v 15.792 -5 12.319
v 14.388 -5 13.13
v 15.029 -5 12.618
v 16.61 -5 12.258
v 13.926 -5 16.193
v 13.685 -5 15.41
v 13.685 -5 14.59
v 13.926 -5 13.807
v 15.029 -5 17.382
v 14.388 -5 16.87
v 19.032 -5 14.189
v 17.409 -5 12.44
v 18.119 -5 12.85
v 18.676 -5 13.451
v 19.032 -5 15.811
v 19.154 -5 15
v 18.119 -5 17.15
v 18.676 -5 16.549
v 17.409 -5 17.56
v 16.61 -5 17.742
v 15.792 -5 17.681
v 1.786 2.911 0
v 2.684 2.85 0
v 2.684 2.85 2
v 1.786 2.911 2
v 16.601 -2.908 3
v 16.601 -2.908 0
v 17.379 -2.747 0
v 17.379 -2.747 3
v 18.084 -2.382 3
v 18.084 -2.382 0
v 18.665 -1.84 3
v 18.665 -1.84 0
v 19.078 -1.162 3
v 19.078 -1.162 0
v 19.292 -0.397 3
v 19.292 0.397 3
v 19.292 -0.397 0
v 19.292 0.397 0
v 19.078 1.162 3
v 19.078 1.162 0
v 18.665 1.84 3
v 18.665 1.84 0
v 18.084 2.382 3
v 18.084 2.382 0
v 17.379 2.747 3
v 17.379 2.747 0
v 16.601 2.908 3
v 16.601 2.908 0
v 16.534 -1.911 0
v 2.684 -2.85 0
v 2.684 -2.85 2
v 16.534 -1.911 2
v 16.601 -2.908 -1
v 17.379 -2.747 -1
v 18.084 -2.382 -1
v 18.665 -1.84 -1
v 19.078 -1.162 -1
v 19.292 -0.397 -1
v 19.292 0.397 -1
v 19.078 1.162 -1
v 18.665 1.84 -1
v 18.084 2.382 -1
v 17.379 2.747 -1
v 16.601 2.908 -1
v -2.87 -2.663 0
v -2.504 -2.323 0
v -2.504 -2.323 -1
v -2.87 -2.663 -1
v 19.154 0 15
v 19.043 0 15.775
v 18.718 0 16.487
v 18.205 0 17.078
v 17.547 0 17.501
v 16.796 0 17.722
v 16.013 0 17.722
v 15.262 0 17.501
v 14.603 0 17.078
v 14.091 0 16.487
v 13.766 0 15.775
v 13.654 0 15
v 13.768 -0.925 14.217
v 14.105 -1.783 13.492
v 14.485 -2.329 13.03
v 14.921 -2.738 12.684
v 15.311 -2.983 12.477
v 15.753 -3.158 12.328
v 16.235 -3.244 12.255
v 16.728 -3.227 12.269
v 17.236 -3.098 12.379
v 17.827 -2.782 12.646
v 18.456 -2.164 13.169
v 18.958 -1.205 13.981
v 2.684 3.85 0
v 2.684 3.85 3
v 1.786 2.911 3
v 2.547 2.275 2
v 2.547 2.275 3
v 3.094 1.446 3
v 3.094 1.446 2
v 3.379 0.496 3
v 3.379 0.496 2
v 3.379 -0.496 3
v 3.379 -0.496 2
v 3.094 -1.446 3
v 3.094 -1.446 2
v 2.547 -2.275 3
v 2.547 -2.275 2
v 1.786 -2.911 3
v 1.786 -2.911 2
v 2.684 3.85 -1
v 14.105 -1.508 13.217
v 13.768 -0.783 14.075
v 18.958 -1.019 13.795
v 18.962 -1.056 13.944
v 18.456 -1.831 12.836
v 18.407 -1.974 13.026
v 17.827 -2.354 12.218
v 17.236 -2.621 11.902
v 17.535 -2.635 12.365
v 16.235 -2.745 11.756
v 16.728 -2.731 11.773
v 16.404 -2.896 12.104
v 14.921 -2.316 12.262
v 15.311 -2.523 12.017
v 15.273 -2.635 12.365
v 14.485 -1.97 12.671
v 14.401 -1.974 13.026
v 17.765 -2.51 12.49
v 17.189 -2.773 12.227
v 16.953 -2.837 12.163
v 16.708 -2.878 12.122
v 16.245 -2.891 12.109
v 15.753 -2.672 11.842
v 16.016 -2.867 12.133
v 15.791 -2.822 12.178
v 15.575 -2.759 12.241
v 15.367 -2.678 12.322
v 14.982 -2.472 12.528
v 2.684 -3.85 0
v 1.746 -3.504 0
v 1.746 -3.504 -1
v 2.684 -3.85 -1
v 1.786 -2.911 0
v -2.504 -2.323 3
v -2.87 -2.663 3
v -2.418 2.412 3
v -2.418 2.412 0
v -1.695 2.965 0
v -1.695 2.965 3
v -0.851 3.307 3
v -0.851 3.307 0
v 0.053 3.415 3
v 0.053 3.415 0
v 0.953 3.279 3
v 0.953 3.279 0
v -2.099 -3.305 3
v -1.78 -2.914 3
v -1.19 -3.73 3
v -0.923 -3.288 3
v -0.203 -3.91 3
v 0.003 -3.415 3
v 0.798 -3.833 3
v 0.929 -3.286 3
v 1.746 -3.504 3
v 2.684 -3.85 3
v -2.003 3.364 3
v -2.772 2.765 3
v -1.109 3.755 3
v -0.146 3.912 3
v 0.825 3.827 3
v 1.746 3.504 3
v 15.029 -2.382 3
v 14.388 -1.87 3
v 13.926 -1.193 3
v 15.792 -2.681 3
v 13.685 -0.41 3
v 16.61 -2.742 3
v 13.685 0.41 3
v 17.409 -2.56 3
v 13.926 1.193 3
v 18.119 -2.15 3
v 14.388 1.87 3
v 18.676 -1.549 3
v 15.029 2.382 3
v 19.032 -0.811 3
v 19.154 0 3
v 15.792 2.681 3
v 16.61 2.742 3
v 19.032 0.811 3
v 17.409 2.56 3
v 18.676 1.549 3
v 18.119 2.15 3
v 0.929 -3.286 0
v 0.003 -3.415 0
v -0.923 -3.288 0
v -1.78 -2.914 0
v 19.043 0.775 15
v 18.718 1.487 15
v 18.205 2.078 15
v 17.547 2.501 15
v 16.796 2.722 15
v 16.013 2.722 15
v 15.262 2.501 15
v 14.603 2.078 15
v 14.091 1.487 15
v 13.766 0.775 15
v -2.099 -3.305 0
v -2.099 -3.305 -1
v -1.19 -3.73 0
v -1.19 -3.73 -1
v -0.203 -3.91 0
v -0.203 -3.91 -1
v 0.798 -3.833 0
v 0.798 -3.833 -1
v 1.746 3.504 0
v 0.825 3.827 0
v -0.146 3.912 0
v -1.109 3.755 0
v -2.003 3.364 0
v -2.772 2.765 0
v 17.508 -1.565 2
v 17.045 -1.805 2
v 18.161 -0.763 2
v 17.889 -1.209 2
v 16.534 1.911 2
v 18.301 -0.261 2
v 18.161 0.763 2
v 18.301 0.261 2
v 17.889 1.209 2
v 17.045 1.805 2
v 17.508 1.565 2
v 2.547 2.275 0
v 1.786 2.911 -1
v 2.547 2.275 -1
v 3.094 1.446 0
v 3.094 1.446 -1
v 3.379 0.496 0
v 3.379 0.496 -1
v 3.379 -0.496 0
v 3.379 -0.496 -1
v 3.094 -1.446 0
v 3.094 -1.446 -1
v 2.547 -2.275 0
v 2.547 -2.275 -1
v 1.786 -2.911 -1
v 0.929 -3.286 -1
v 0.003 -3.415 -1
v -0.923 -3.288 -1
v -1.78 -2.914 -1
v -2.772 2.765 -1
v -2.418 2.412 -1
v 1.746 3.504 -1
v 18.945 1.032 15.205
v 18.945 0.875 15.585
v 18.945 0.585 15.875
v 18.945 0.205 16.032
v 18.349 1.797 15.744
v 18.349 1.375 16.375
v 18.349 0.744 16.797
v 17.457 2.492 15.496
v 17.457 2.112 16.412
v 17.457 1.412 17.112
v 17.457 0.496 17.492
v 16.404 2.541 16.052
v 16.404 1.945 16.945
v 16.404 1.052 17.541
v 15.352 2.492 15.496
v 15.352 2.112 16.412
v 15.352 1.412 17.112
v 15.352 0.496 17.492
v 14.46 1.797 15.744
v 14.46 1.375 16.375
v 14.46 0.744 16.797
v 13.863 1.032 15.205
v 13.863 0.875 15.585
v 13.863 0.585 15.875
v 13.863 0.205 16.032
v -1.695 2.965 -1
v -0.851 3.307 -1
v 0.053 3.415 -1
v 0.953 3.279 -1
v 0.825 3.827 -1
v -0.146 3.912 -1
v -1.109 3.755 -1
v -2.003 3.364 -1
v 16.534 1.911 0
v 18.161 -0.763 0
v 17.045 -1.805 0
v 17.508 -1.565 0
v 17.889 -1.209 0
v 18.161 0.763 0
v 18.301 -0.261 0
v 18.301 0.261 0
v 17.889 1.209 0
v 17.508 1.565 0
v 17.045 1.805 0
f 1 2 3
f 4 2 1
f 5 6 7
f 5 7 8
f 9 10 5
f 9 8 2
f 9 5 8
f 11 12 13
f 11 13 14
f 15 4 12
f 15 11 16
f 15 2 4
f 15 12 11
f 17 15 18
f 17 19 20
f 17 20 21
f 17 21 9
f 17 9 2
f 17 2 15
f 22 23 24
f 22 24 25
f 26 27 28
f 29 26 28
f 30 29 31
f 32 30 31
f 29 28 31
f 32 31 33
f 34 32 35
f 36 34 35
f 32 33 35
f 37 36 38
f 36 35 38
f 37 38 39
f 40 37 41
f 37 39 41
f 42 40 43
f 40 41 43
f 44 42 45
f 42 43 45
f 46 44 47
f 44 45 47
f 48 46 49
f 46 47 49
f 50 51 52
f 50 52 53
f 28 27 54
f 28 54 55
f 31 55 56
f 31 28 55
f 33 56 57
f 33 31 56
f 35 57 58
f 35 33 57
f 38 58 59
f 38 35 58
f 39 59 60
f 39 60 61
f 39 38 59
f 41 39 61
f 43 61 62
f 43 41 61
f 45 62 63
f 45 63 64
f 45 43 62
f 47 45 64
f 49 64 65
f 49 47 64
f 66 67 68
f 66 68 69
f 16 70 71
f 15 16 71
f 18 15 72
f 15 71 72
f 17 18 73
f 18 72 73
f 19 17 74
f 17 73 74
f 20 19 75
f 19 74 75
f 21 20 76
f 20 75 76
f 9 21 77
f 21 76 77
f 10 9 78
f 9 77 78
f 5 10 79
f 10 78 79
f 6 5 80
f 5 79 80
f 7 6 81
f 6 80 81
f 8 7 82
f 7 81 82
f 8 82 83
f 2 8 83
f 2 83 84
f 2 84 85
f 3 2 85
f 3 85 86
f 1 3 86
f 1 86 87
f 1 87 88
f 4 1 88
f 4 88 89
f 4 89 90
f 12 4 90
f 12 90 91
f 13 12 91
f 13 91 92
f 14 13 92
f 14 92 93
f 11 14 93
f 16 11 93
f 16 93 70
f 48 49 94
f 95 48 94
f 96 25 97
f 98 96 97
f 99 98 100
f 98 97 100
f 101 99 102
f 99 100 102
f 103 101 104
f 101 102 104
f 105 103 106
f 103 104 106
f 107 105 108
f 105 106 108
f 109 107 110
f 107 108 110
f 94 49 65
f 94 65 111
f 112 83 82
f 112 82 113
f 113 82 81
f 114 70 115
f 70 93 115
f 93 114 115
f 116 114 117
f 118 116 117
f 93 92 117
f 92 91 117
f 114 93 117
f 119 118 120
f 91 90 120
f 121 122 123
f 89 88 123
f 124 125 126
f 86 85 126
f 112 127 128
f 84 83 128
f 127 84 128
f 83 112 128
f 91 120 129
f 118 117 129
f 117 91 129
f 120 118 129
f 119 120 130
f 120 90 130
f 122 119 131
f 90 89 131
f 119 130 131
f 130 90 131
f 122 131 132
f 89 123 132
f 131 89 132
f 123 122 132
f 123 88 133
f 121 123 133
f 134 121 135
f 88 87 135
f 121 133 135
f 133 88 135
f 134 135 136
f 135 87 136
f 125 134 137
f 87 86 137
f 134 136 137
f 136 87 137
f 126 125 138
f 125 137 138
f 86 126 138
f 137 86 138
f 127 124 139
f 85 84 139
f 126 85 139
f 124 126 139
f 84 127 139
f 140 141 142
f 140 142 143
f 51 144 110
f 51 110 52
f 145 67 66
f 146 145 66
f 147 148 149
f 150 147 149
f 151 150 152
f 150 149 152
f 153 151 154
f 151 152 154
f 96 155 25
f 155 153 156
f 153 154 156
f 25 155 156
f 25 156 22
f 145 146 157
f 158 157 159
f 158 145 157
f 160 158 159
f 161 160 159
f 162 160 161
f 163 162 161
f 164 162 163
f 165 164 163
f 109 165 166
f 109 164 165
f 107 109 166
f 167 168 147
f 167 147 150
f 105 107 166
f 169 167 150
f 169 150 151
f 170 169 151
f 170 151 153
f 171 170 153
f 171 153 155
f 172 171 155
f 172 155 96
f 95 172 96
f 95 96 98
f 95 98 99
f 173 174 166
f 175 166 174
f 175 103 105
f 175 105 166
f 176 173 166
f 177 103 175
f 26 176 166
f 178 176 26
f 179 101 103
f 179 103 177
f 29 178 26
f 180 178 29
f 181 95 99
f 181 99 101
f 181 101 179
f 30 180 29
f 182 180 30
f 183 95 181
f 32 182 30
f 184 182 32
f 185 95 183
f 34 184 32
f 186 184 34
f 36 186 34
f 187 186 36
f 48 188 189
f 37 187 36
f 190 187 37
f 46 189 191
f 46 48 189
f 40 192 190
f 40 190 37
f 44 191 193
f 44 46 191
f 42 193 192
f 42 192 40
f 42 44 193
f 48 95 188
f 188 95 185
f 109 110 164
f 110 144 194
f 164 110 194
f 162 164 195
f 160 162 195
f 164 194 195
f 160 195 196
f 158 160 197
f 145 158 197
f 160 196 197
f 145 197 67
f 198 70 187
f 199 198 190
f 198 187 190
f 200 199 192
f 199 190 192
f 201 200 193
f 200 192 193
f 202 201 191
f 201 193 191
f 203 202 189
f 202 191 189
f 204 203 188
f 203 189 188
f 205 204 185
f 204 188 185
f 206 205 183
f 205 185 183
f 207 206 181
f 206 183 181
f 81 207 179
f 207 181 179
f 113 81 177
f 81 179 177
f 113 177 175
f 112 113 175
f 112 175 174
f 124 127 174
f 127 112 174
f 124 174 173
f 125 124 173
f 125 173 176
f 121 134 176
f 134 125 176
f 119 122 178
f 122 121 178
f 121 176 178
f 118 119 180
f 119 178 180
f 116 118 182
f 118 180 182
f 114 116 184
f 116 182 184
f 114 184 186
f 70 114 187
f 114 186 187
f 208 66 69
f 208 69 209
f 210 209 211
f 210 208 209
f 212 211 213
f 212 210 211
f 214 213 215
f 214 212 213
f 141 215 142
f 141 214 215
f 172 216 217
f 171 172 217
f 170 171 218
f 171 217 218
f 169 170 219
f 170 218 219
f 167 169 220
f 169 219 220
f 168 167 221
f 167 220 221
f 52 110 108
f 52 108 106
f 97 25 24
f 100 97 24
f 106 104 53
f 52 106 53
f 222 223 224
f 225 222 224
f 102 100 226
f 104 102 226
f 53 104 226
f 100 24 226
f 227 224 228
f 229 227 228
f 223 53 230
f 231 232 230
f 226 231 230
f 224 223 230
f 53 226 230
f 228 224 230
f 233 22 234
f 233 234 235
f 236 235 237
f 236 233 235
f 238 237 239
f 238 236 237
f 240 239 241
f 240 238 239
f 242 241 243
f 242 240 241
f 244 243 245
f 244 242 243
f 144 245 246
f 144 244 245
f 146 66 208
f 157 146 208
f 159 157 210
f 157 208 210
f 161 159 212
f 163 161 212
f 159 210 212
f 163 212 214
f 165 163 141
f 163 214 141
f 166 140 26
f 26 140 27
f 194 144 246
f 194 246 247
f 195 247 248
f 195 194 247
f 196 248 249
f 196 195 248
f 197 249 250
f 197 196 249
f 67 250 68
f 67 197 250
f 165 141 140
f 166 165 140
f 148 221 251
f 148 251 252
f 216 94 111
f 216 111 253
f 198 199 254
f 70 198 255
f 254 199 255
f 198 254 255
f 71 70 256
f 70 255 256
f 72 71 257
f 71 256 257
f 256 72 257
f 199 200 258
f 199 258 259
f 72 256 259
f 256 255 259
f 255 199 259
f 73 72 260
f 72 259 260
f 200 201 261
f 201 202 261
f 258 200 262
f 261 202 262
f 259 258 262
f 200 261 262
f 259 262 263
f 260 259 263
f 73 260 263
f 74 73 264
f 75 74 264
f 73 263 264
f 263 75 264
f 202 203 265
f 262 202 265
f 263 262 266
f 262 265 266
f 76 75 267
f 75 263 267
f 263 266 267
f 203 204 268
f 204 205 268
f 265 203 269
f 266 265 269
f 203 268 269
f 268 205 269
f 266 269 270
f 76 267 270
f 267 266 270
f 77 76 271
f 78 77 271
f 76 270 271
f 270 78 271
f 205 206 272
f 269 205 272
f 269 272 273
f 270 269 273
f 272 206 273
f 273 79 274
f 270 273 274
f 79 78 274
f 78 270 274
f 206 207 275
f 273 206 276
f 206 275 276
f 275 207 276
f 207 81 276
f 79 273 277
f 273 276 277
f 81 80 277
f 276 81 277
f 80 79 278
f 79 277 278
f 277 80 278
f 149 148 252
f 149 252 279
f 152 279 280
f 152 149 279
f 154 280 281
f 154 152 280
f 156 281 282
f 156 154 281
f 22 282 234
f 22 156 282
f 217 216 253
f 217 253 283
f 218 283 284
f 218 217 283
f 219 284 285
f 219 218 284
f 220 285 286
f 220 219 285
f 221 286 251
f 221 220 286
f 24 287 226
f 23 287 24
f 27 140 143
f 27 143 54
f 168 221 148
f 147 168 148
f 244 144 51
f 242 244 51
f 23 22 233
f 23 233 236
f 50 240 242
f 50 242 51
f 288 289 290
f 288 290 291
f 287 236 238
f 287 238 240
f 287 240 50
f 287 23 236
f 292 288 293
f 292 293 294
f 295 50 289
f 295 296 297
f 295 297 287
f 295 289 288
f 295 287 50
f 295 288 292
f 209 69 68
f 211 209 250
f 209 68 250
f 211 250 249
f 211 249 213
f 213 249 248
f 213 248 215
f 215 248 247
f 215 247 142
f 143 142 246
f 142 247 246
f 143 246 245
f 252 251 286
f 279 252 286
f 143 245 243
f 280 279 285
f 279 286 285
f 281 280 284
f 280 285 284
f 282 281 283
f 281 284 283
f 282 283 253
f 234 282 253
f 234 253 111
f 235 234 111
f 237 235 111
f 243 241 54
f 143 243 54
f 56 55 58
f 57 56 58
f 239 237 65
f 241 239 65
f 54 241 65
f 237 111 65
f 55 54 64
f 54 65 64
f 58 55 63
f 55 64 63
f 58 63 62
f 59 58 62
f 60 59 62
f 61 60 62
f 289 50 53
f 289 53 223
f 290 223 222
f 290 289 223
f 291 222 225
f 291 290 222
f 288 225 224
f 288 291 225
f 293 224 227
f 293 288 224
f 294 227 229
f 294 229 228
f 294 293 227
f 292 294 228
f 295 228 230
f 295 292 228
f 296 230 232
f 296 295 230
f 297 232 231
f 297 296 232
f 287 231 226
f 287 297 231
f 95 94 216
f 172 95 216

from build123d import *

# Parameters (mm, degrees)
F1_DEPTH = 1
F2_DEPTH = 3
F3_DEPTH = 2
F4_R     = 2.75
F5_DEPTH = 12
F7_ANGLE = 90
F8_R     = 2.75
F9_DEPTH = 5
F10_R    = 0.5


# Not quite as in the source:
# - a feature names something its author has since deleted; it is built from what else it names


with BuildPart() as f1:
    # F0 (on Top) → F1 (new body)
    with BuildSketch(Plane.XY):
        with BuildLine():
            ThreePointArc((1.7856760203, -2.9109424849), (-0.4640879363, -3.3833189899), (-2.5035568051, -2.3225908645))
            Line((-2.5035568051, -2.3225908645), (-2.870109778, -2.6626480921))
            ThreePointArc((-2.870109778, -2.6626480921), (-0.7021528954, -3.8515200001), (1.745866363, -3.5041654702))
            ThreePointArc((1.745866363, -3.5041654702), (2.2390334242, -3.2115345748), (2.6841618804, -2.85))
            Line((2.6841618804, -2.85), (1.7856760203, -2.9109424849))
        make_face()
        with BuildLine():
            ThreePointArc((1.7856760202, 2.910942485), (3.415, 0), (1.7856760203, -2.9109424849))
            Line((1.7856760203, -2.9109424849), (2.6841618804, -2.85))
            ThreePointArc((2.6841618804, -2.85), (3.915, 0), (2.6841618804, 2.85))
            Line((2.6841618803, 2.85), (1.7856760202, 2.910942485))
        make_face()
        with BuildLine():
            ThreePointArc((-2.4179432279, 2.4115919113), (-0.4028376898, 3.391157147), (1.7856760202, 2.910942485))
            Line((1.7856760202, 2.910942485), (2.6841618803, 2.85))
            ThreePointArc((2.6841618804, 2.85), (2.2390334242, 3.2115345748), (1.7458663629, 3.5041654702))
            ThreePointArc((1.7458663629, 3.5041654702), (-0.6323981068, 3.8635861107), (-2.7719612701, 2.7646800388))
            Line((-2.7719612701, 2.7646800388), (-2.4179432279, 2.4115919113))
        make_face()
        with BuildLine():
            Line((16.533754708, -1.9106100332), (2.6841618804, -2.85))
            ThreePointArc((2.6841618804, -2.85), (2.2390334242, -3.2115345748), (1.745866363, -3.5041654702))
            Line((1.745866363, -3.5041654702), (2.6841618804, -3.85))
            Line((2.6841618804, -3.85), (16.6009492353, -2.9083500025))
            ThreePointArc((16.6009492353, -2.9083500025), (19.3191618804, 0), (16.6009492353, 2.9083500025))
            Line((16.6009492353, 2.9083500025), (2.6841618803, 3.85))
            Line((2.6841618803, 3.85), (2.6841618803, 2.85))
            Line((2.6841618803, 2.85), (16.533754708, 1.9106100332))
            ThreePointArc((16.533754708, 1.9106100332), (18.3191618804, 0), (16.533754708, -1.9106100332))
        make_face()
        with BuildLine():
            ThreePointArc((2.6841618804, 2.85), (3.915, 0), (2.6841618804, -2.85))
            Line((2.6841618804, -2.85), (16.533754708, -1.9106100332))
            ThreePointArc((16.533754708, -1.9106100332), (18.3191618804, 0), (16.533754708, 1.9106100332))
            Line((16.533754708, 1.9106100332), (2.6841618803, 2.85))
        make_face()
        with BuildLine():
            ThreePointArc((1.7458663629, 3.5041654702), (2.2390334242, 3.2115345748), (2.6841618804, 2.85))
            Line((2.6841618803, 2.85), (2.6841618803, 3.85))
            Line((2.6841618803, 3.85), (1.7458663629, 3.5041654702))
        make_face()
    extrude(amount=-F1_DEPTH)

    # F0 (on Top) → F2 (join)
    with BuildSketch(Plane.XY):
        with BuildLine():
            ThreePointArc((1.7856760203, -2.9109424849), (-0.4640879363, -3.3833189899), (-2.5035568051, -2.3225908645))
            Line((-2.5035568051, -2.3225908645), (-2.870109778, -2.6626480921))
            ThreePointArc((-2.870109778, -2.6626480921), (-0.7021528954, -3.8515200001), (1.745866363, -3.5041654702))
            ThreePointArc((1.745866363, -3.5041654702), (2.2390334242, -3.2115345748), (2.6841618804, -2.85))
            Line((2.6841618804, -2.85), (1.7856760203, -2.9109424849))
        make_face()
        with BuildLine():
            ThreePointArc((1.7856760202, 2.910942485), (3.415, 0), (1.7856760203, -2.9109424849))
            Line((1.7856760203, -2.9109424849), (2.6841618804, -2.85))
            ThreePointArc((2.6841618804, -2.85), (3.915, 0), (2.6841618804, 2.85))
            Line((2.6841618803, 2.85), (1.7856760202, 2.910942485))
        make_face()
        with BuildLine():
            ThreePointArc((-2.4179432279, 2.4115919113), (-0.4028376898, 3.391157147), (1.7856760202, 2.910942485))
            Line((1.7856760202, 2.910942485), (2.6841618803, 2.85))
            ThreePointArc((2.6841618804, 2.85), (2.2390334242, 3.2115345748), (1.7458663629, 3.5041654702))
            ThreePointArc((1.7458663629, 3.5041654702), (-0.6323981068, 3.8635861107), (-2.7719612701, 2.7646800388))
            Line((-2.7719612701, 2.7646800388), (-2.4179432279, 2.4115919113))
        make_face()
        with BuildLine():
            ThreePointArc((1.7458663629, 3.5041654702), (2.2390334242, 3.2115345748), (2.6841618804, 2.85))
            Line((2.6841618803, 2.85), (2.6841618803, 3.85))
            Line((2.6841618803, 3.85), (1.7458663629, 3.5041654702))
        make_face()
        with BuildLine():
            Line((16.533754708, -1.9106100332), (2.6841618804, -2.85))
            ThreePointArc((2.6841618804, -2.85), (2.2390334242, -3.2115345748), (1.745866363, -3.5041654702))
            Line((1.745866363, -3.5041654702), (2.6841618804, -3.85))
            Line((2.6841618804, -3.85), (16.6009492353, -2.9083500025))
            ThreePointArc((16.6009492353, -2.9083500025), (19.3191618804, 0), (16.6009492353, 2.9083500025))
            Line((16.6009492353, 2.9083500025), (2.6841618803, 3.85))
            Line((2.6841618803, 3.85), (2.6841618803, 2.85))
            Line((2.6841618803, 2.85), (16.533754708, 1.9106100332))
            ThreePointArc((16.533754708, 1.9106100332), (18.3191618804, 0), (16.533754708, -1.9106100332))
        make_face()
        with BuildLine():
            ThreePointArc((2.6841618804, 2.85), (3.915, 0), (2.6841618804, -2.85))
            Line((2.6841618804, -2.85), (16.533754708, -1.9106100332))
            ThreePointArc((16.533754708, -1.9106100332), (18.3191618804, 0), (16.533754708, 1.9106100332))
            Line((16.533754708, 1.9106100332), (2.6841618803, 2.85))
        make_face()
    extrude(amount=F2_DEPTH)

    # F0 (on Top) → F3 (cut)
    with BuildSketch(Plane.XY):
        with BuildLine():
            ThreePointArc((2.6841618804, 2.85), (3.915, 0), (2.6841618804, -2.85))
            Line((2.6841618804, -2.85), (16.533754708, -1.9106100332))
            ThreePointArc((16.533754708, -1.9106100332), (18.3191618804, 0), (16.533754708, 1.9106100332))
            Line((16.533754708, 1.9106100332), (2.6841618803, 2.85))
        make_face()
        with BuildLine():
            ThreePointArc((1.7856760202, 2.910942485), (3.415, 0), (1.7856760203, -2.9109424849))
            Line((1.7856760203, -2.9109424849), (2.6841618804, -2.85))
            ThreePointArc((2.6841618804, -2.85), (3.915, 0), (2.6841618804, 2.85))
            Line((2.6841618803, 2.85), (1.7856760202, 2.910942485))
        make_face()
    extrude(amount=F3_DEPTH, mode=Mode.SUBTRACT)

    # F4 (on face) → F5 (join)
    with BuildSketch(Plane.XY.offset(3)):
        with Locations((16.4041618804, 0)):
            Circle(F4_R)
    extrude(amount=F5_DEPTH)

    # F6 (on face) → F7 (revolve)
    with BuildSketch(Plane.XY.offset(15)):
        with BuildLine():
            Line((13.6541618804, 0), (19.1541618804, 0))
            ThreePointArc((19.1541618804, 0), (16.4041618804, 2.75), (13.6541618804, 0))
        make_face()
    revolve(axis=Axis((16.4041618804, 0, 15), (1, 0, 0)), revolution_arc=F7_ANGLE)

    # F8 (on face) → F9 (join)
    with BuildSketch(Plane.XZ):
        with Locations((16.4041618804, 15)):
            Circle(F8_R)
    extrude(amount=F9_DEPTH)

    # F10
    f10_edges = [f1.edges().sort_by_distance(p)[0] for p in [
        (18.503226, -1.776634, 13.223366),
        (14.305098, -1.776634, 13.223366),
    ]]
    fillet(f10_edges, radius=F10_R)


solid = f1.part
